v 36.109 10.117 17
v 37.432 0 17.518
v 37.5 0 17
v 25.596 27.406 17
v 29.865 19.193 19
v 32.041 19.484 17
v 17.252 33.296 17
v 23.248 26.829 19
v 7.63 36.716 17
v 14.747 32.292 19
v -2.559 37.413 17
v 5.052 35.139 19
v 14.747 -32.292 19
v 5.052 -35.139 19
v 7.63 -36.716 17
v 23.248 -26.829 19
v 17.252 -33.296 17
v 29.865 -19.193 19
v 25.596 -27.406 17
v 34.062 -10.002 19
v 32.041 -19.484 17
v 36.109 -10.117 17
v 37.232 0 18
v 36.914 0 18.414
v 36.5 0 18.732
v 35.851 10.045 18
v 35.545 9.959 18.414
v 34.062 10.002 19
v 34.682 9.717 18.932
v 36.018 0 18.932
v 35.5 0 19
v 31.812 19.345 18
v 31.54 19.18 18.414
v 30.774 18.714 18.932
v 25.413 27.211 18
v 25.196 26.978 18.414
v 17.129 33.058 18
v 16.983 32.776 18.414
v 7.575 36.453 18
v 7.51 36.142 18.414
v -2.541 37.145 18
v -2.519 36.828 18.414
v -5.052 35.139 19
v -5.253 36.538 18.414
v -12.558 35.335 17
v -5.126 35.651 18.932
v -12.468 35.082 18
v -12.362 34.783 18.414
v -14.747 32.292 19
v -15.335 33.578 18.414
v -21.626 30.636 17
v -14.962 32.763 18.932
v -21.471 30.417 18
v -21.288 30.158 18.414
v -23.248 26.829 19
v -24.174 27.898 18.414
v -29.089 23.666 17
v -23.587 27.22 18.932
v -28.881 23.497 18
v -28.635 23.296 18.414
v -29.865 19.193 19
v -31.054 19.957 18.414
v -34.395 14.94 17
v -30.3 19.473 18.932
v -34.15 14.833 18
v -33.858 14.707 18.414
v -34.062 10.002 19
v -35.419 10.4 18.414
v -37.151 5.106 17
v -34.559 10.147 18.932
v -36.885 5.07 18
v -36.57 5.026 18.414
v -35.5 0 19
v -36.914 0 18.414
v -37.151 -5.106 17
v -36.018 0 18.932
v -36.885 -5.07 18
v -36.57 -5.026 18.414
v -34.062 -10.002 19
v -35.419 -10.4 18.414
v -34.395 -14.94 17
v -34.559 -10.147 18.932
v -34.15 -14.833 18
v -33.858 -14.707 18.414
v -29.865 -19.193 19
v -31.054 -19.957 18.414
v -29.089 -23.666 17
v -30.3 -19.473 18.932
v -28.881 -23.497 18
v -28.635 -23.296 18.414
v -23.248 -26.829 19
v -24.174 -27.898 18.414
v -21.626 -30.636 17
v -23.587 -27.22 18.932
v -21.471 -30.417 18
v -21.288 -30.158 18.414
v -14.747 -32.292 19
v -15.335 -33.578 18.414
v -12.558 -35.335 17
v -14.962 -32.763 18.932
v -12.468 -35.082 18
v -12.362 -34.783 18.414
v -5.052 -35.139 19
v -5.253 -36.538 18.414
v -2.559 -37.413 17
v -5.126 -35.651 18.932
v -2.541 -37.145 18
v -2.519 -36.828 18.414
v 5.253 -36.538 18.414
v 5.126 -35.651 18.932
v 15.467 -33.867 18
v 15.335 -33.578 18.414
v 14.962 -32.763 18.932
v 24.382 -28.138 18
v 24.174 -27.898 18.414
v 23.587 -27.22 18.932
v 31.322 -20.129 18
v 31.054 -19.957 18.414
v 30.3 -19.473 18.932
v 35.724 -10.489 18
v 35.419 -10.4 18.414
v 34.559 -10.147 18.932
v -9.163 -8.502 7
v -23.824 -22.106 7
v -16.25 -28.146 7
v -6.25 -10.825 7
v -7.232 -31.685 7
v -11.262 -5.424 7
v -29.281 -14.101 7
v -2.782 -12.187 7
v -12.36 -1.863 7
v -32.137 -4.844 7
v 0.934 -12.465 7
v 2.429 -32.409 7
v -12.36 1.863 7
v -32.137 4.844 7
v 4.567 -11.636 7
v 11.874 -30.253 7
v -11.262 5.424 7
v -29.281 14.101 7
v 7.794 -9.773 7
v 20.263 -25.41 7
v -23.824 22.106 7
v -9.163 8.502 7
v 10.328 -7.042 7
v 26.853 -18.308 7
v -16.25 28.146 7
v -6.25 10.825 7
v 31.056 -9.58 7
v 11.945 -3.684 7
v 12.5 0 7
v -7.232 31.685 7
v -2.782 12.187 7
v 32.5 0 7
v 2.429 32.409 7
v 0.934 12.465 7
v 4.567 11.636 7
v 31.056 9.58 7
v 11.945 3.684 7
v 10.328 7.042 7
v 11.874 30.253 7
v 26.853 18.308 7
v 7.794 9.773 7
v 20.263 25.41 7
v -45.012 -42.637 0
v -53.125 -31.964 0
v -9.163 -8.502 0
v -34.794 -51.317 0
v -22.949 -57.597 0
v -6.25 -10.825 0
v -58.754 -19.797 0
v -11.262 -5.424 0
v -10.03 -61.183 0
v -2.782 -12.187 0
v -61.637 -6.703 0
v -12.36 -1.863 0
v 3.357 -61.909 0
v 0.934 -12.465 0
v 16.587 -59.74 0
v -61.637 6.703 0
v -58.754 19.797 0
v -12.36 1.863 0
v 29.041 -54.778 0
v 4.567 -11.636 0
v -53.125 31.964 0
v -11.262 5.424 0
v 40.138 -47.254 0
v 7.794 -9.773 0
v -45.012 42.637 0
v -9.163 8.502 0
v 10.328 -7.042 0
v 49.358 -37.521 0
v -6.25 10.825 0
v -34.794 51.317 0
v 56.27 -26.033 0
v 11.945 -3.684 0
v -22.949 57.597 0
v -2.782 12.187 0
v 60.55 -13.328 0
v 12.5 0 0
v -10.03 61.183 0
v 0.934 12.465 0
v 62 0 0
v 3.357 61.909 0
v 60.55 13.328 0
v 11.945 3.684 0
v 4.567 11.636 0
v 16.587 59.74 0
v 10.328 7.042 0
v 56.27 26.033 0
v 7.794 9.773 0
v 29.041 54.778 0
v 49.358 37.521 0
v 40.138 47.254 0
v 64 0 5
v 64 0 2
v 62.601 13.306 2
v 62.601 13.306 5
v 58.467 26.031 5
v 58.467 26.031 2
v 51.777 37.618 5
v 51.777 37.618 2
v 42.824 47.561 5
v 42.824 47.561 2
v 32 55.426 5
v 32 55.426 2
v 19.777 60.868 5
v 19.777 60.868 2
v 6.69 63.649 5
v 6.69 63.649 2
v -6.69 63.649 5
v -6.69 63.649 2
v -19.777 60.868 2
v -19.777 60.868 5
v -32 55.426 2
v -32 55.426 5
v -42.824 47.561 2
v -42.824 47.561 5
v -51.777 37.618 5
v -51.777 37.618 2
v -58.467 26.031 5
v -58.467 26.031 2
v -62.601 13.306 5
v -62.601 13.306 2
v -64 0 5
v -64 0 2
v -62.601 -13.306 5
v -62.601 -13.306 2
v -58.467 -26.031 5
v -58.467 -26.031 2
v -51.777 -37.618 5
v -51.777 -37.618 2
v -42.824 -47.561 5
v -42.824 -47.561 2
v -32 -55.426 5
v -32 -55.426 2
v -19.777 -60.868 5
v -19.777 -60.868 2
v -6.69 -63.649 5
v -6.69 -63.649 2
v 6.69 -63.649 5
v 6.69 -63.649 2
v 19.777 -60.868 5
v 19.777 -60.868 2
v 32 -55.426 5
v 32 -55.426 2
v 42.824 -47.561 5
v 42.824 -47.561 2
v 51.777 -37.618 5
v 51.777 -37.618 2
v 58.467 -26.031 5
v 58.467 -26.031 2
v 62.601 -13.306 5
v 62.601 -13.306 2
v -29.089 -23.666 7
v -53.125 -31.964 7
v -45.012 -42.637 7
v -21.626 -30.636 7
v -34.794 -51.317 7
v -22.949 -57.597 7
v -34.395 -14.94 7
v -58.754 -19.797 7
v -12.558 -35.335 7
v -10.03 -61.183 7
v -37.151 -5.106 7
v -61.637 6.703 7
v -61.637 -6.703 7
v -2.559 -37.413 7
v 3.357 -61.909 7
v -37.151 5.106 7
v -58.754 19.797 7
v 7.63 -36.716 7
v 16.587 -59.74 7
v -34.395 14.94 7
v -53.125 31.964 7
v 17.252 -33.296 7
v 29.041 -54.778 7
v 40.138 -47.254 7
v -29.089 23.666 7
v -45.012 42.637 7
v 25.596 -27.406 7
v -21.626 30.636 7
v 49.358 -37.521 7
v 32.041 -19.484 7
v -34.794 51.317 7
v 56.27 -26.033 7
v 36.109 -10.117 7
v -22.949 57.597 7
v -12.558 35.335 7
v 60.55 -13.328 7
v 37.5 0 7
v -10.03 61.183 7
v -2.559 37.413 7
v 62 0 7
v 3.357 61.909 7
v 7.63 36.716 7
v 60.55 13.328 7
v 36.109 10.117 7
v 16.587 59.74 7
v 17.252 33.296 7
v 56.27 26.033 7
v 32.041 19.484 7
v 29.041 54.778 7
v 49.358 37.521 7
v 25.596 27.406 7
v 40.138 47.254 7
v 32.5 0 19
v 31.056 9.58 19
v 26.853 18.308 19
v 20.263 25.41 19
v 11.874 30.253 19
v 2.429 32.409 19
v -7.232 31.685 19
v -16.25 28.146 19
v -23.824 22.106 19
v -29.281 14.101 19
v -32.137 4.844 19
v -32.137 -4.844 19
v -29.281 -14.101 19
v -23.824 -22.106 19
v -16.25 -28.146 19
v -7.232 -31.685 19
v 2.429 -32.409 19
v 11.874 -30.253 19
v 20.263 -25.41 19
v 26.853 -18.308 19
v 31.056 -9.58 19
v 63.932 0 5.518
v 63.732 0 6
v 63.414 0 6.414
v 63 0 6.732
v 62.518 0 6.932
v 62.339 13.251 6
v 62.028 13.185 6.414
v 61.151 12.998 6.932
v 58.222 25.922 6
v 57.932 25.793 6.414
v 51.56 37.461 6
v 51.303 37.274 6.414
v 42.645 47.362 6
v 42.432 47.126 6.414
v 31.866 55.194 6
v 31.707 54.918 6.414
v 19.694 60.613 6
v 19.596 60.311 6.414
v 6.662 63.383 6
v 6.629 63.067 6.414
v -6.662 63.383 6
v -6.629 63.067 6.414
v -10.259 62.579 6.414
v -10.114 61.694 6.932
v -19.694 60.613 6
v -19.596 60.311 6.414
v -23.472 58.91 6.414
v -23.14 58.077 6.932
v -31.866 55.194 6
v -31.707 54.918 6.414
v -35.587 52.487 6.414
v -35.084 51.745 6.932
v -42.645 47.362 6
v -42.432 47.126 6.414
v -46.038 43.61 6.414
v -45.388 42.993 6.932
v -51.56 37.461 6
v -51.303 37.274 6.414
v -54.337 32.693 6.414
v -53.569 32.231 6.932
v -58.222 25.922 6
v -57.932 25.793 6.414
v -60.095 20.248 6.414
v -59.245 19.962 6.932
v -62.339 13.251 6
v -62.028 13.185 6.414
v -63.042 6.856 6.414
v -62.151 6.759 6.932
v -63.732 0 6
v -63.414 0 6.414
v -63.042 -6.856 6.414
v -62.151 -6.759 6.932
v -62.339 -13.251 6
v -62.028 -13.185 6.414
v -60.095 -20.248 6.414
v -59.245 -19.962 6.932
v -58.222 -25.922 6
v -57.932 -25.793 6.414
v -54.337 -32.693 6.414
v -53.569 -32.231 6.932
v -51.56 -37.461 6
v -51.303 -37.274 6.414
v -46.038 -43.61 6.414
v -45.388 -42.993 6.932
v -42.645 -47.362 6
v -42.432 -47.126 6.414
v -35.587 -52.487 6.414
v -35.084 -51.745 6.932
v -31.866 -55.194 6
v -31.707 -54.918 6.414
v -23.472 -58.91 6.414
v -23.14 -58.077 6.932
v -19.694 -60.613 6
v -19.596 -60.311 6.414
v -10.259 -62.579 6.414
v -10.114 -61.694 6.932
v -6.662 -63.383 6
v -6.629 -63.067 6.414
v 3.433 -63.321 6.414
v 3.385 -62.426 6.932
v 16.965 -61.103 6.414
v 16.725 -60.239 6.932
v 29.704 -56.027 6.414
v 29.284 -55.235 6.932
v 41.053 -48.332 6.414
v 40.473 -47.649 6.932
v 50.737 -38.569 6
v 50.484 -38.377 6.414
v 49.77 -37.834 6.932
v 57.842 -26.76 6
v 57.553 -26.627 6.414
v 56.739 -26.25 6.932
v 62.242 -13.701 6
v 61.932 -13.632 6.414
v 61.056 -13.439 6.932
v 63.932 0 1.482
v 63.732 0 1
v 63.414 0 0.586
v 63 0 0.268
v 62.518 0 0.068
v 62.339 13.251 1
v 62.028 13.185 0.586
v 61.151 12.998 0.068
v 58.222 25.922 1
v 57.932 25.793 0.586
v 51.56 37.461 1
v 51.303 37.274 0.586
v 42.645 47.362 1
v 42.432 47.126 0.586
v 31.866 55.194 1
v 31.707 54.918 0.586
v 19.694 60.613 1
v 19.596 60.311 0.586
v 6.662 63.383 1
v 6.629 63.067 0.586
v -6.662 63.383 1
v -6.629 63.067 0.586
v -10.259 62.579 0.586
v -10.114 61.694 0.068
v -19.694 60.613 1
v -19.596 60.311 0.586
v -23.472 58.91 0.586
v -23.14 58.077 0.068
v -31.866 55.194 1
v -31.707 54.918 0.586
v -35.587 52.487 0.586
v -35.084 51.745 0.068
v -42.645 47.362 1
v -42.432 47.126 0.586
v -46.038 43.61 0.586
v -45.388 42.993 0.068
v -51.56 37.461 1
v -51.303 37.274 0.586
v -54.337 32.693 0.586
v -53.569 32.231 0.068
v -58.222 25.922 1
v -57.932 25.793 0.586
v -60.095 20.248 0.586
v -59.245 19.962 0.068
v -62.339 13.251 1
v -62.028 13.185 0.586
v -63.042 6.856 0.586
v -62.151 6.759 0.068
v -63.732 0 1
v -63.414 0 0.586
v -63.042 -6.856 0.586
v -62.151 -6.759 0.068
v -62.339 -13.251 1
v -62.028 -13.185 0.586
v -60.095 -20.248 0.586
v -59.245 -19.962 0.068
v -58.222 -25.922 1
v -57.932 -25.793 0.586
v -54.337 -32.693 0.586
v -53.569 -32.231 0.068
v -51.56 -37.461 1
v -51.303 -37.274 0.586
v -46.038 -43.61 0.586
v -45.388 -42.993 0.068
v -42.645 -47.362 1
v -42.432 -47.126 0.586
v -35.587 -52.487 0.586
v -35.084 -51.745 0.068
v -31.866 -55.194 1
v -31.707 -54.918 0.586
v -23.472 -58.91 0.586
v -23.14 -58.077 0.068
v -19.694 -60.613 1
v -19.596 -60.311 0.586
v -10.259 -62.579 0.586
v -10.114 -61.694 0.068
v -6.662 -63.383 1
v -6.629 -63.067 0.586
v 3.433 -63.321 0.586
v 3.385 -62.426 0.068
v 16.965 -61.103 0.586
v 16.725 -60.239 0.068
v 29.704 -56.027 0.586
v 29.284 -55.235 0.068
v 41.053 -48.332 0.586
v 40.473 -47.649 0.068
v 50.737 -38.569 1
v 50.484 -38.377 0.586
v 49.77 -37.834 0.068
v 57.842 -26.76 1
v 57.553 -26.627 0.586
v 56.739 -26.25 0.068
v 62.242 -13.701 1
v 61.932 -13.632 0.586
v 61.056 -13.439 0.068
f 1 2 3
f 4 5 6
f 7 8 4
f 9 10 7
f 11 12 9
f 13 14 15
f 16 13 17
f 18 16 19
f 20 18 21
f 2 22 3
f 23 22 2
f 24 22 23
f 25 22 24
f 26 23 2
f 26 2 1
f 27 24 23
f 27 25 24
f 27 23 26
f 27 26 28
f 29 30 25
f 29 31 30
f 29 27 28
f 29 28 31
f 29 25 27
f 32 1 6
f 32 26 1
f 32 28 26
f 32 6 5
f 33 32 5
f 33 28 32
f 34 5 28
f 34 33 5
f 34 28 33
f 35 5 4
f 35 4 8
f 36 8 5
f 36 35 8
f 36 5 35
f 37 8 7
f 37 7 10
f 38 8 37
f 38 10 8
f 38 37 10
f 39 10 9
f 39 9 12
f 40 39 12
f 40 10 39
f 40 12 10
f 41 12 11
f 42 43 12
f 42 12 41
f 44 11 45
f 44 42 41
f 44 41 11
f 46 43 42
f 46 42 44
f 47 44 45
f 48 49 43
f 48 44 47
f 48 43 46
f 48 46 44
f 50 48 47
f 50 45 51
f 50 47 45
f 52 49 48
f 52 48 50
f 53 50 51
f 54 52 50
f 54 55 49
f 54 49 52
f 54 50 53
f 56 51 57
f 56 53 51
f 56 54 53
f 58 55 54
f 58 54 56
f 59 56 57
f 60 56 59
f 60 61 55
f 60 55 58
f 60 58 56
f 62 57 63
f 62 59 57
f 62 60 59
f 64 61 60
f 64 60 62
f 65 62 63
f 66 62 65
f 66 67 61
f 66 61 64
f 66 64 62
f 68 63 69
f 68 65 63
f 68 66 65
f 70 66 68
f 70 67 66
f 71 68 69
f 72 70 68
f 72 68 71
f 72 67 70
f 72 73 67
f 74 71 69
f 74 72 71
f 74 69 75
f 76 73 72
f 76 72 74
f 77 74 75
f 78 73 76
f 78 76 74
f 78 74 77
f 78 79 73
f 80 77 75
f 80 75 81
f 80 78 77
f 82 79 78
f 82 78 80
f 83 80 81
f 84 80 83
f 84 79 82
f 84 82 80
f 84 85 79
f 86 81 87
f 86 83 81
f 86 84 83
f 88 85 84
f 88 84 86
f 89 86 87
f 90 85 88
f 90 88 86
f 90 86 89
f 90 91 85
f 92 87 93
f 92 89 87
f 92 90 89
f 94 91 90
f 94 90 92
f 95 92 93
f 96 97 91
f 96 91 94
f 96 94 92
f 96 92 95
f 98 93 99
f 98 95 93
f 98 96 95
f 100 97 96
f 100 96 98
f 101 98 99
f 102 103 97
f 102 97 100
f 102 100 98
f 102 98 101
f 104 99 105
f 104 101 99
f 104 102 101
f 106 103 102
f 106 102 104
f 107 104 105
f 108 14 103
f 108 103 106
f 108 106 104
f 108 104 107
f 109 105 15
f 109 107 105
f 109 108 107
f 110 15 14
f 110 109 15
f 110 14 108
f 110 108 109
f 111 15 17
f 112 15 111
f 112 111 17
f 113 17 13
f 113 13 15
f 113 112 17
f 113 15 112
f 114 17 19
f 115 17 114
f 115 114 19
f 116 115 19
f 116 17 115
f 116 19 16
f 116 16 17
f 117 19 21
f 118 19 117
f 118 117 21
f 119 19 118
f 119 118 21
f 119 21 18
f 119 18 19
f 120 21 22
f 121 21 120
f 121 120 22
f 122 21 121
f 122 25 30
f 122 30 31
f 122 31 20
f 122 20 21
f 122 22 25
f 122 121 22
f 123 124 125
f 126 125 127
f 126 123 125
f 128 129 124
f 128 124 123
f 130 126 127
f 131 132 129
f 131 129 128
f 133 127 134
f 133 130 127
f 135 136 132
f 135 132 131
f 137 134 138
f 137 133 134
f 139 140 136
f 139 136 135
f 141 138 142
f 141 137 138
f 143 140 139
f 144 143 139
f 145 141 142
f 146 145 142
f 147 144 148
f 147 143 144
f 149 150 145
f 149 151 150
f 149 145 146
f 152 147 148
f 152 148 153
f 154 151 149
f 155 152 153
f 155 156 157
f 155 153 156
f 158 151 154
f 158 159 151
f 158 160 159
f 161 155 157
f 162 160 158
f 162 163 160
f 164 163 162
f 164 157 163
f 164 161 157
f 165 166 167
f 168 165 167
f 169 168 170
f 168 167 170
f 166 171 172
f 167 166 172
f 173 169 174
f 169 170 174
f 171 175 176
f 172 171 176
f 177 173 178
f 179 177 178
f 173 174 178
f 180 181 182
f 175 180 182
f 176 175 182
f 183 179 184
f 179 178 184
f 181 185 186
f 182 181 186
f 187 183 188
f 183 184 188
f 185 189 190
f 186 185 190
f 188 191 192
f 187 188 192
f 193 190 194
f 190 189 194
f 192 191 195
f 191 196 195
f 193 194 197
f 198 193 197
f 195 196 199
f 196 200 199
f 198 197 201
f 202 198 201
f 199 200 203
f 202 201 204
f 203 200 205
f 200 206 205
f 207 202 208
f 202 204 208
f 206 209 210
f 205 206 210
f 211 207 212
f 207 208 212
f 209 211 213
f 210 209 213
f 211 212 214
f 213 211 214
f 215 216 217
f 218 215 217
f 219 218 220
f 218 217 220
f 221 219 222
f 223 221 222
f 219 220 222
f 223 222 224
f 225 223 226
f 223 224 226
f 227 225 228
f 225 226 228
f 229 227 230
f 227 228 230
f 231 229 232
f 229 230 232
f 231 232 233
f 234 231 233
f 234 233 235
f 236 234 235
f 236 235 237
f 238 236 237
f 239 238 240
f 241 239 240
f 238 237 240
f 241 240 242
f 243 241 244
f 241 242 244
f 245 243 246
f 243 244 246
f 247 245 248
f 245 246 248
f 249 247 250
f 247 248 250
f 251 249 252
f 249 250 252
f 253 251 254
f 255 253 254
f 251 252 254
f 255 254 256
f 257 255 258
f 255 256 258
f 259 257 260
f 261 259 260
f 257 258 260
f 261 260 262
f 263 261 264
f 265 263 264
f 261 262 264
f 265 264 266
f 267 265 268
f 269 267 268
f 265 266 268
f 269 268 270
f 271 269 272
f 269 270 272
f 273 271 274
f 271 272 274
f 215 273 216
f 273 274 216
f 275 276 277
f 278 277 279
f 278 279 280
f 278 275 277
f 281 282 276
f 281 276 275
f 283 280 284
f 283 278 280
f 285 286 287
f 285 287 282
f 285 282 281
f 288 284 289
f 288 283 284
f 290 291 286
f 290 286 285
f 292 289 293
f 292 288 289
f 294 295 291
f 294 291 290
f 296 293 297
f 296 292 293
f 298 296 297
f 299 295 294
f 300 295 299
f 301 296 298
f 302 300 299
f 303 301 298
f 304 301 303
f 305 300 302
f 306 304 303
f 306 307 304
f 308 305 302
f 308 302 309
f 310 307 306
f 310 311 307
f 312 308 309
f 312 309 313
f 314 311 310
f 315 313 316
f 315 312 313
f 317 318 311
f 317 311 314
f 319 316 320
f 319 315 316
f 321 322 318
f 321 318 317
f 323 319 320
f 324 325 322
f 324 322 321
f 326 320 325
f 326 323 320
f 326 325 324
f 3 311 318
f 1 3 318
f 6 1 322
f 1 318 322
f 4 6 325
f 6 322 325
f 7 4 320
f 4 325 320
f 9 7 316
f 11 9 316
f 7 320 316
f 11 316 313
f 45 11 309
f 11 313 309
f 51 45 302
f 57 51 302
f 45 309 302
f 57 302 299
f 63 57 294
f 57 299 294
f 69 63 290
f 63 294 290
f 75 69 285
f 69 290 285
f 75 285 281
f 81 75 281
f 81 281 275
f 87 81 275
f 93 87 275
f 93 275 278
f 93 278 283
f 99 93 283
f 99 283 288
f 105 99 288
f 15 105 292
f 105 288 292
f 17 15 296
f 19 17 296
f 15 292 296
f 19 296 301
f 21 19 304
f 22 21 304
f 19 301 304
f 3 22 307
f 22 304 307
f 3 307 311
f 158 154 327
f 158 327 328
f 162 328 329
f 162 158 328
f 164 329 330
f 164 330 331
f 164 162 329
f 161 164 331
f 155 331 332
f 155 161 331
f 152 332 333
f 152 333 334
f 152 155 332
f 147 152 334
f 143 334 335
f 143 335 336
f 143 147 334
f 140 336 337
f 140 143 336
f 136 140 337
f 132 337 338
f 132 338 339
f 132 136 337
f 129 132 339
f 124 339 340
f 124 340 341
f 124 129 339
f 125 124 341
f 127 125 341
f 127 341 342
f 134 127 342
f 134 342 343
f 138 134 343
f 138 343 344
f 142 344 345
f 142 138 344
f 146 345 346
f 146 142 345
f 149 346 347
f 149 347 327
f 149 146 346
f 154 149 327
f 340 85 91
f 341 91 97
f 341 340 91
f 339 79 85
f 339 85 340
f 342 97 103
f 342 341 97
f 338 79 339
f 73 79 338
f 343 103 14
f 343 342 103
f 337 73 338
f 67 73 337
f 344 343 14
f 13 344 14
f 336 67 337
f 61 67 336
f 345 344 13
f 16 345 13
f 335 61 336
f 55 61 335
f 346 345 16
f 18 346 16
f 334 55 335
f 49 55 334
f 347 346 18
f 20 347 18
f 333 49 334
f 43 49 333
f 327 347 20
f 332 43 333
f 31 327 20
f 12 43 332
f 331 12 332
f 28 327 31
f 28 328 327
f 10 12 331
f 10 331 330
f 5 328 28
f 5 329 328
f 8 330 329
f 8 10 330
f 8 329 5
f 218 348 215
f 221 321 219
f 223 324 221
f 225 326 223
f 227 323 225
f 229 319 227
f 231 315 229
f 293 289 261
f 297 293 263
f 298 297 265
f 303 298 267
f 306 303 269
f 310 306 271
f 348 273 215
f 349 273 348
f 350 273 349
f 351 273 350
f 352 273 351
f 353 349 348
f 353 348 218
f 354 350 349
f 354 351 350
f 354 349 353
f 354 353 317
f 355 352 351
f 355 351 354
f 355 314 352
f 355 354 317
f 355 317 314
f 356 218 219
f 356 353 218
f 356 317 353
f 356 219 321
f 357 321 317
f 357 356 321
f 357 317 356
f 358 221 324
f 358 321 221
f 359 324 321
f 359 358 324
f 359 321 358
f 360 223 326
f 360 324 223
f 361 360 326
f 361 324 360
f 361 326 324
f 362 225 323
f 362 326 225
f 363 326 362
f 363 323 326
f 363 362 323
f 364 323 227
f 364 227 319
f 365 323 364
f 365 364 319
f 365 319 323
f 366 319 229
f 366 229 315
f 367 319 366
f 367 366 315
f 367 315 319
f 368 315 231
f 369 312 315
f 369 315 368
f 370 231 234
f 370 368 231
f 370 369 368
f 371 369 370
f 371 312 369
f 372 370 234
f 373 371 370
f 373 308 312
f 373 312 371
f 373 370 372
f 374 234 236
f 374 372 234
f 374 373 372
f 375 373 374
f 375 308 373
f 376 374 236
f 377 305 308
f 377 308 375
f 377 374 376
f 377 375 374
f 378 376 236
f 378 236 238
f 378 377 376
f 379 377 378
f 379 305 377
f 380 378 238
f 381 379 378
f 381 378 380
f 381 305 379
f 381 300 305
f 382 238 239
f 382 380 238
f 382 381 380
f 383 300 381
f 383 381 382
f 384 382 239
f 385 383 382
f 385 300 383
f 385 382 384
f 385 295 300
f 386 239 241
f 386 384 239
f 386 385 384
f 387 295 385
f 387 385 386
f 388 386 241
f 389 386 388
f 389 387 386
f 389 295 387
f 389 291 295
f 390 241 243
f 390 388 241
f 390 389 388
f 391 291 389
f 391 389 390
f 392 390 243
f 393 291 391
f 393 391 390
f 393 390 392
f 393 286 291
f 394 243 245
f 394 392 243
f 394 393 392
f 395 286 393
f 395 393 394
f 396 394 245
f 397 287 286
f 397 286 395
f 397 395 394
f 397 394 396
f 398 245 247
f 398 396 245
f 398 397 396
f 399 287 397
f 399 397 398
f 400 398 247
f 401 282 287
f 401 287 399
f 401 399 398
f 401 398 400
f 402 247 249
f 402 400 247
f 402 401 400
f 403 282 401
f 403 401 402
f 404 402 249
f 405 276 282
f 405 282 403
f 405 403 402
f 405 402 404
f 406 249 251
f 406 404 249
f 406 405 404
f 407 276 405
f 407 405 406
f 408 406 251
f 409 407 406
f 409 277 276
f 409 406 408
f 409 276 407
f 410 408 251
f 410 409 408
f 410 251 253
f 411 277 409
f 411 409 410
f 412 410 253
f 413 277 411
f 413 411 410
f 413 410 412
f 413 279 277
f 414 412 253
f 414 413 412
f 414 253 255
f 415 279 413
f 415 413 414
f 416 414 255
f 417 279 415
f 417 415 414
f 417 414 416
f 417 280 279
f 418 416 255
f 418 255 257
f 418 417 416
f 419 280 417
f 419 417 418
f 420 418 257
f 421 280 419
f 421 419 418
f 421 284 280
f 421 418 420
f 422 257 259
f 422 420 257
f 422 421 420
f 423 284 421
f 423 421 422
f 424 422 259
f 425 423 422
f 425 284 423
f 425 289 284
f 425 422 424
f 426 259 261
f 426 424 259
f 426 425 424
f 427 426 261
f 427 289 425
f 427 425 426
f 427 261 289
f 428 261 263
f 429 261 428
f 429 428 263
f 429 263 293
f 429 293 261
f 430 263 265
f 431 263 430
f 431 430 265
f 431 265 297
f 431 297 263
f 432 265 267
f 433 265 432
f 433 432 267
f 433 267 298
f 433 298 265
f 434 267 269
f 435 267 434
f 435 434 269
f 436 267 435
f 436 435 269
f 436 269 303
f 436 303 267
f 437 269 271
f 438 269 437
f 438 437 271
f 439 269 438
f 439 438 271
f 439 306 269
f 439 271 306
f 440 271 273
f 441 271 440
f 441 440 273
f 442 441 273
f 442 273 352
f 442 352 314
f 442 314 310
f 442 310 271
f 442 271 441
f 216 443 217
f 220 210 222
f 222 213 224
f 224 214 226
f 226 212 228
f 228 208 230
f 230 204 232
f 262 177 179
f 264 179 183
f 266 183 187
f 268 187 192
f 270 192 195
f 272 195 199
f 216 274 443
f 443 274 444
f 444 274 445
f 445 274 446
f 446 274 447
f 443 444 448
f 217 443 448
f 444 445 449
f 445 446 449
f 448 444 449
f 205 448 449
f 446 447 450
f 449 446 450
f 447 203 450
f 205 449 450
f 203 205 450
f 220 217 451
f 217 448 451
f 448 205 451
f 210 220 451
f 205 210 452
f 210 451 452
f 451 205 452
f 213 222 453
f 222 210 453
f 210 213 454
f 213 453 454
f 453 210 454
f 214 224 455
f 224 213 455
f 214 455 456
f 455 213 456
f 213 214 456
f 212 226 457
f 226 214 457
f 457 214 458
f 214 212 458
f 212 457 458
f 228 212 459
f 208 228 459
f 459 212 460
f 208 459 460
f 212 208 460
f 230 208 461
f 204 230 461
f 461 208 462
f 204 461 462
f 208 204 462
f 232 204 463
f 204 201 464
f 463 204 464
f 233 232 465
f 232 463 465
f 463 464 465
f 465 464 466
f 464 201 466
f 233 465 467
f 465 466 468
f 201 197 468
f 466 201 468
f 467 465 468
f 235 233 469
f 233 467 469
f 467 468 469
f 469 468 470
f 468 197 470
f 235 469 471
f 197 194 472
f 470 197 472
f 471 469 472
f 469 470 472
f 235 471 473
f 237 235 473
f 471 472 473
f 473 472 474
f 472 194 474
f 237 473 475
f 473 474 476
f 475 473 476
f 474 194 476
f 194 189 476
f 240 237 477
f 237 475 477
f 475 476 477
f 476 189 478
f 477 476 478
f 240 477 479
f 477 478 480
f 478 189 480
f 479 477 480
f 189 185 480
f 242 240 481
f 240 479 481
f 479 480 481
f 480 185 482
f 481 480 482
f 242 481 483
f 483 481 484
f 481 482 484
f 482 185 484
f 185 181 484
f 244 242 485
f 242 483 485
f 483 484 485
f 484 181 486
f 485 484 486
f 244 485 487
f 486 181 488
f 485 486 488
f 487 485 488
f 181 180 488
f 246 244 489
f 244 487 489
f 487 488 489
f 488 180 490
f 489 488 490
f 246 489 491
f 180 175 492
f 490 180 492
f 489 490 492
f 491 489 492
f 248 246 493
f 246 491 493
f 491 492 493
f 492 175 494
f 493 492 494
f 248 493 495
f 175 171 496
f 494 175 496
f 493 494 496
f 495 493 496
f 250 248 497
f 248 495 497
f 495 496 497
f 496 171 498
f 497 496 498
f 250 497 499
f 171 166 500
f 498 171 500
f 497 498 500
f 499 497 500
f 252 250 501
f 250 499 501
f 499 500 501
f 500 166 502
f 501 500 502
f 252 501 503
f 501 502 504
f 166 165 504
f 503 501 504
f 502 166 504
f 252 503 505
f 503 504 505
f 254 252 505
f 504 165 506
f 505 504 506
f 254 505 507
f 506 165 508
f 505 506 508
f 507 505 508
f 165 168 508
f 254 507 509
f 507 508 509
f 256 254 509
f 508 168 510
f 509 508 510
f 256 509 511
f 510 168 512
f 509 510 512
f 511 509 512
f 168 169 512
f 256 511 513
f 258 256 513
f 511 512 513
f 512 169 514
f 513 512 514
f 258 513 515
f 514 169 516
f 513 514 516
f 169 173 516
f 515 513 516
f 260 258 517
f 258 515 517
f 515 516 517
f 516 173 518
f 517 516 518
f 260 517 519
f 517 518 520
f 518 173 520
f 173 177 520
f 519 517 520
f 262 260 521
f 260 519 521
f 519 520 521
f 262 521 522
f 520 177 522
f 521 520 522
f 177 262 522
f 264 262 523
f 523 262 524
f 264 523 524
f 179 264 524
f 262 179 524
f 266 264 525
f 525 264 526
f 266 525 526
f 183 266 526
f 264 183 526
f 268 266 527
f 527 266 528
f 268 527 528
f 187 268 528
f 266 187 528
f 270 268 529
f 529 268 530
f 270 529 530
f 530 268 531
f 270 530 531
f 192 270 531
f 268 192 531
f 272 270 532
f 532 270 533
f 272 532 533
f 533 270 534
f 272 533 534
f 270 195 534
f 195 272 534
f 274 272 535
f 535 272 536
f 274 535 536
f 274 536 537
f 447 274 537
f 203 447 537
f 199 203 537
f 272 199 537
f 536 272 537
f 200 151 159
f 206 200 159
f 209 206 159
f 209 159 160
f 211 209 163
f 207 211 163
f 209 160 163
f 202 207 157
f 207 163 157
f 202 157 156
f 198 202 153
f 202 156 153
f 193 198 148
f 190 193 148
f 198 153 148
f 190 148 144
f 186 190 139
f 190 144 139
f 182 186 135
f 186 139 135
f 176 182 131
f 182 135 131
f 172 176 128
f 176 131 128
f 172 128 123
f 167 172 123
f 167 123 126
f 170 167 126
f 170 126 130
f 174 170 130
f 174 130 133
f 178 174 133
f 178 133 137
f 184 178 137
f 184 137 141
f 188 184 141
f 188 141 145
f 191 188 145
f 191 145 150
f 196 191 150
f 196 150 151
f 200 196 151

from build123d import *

# Parameters (mm, degrees)
SKETCH1_R           = 64
BOSS_EXTRUDE2_DEPTH = 7
SKETCH3_R           = 37.5
SKETCH3_R_2         = 32.5
BOSS_EXTRUDE3_DEPTH = 12
SKETCH6_R           = 12.5
CUT_EXTRUDE1_DEPTH  = 8
FILLET1_R           = 2


with BuildPart() as part:
    # Sketch1 → Boss-Extrude2 (new body)
    with BuildSketch(Plane.XY):
        Circle(SKETCH1_R)
    extrude(amount=BOSS_EXTRUDE2_DEPTH)

    # Sketch3 → Boss-Extrude3 (add)
    with BuildSketch(Plane.XY.offset(7)):
        Circle(SKETCH3_R)
        Circle(SKETCH3_R_2, mode=Mode.SUBTRACT)
    extrude(amount=BOSS_EXTRUDE3_DEPTH)

    # Sketch6 → Cut-Extrude1 (cut, through all)
    with BuildSketch(Plane.XY.offset(7)):
        Circle(SKETCH6_R)
    extrude(amount=-CUT_EXTRUDE1_DEPTH, mode=Mode.SUBTRACT)

    # Fillet1
    fillet1_edges = [part.edges().sort_by_distance(p)[0] for p in [
        (-64, 0, 0),
        (-64, 0, 7),
        (-37.5, 0, 19),
    ]]
    fillet(fillet1_edges, radius=FILLET1_R)


solid = part.part
